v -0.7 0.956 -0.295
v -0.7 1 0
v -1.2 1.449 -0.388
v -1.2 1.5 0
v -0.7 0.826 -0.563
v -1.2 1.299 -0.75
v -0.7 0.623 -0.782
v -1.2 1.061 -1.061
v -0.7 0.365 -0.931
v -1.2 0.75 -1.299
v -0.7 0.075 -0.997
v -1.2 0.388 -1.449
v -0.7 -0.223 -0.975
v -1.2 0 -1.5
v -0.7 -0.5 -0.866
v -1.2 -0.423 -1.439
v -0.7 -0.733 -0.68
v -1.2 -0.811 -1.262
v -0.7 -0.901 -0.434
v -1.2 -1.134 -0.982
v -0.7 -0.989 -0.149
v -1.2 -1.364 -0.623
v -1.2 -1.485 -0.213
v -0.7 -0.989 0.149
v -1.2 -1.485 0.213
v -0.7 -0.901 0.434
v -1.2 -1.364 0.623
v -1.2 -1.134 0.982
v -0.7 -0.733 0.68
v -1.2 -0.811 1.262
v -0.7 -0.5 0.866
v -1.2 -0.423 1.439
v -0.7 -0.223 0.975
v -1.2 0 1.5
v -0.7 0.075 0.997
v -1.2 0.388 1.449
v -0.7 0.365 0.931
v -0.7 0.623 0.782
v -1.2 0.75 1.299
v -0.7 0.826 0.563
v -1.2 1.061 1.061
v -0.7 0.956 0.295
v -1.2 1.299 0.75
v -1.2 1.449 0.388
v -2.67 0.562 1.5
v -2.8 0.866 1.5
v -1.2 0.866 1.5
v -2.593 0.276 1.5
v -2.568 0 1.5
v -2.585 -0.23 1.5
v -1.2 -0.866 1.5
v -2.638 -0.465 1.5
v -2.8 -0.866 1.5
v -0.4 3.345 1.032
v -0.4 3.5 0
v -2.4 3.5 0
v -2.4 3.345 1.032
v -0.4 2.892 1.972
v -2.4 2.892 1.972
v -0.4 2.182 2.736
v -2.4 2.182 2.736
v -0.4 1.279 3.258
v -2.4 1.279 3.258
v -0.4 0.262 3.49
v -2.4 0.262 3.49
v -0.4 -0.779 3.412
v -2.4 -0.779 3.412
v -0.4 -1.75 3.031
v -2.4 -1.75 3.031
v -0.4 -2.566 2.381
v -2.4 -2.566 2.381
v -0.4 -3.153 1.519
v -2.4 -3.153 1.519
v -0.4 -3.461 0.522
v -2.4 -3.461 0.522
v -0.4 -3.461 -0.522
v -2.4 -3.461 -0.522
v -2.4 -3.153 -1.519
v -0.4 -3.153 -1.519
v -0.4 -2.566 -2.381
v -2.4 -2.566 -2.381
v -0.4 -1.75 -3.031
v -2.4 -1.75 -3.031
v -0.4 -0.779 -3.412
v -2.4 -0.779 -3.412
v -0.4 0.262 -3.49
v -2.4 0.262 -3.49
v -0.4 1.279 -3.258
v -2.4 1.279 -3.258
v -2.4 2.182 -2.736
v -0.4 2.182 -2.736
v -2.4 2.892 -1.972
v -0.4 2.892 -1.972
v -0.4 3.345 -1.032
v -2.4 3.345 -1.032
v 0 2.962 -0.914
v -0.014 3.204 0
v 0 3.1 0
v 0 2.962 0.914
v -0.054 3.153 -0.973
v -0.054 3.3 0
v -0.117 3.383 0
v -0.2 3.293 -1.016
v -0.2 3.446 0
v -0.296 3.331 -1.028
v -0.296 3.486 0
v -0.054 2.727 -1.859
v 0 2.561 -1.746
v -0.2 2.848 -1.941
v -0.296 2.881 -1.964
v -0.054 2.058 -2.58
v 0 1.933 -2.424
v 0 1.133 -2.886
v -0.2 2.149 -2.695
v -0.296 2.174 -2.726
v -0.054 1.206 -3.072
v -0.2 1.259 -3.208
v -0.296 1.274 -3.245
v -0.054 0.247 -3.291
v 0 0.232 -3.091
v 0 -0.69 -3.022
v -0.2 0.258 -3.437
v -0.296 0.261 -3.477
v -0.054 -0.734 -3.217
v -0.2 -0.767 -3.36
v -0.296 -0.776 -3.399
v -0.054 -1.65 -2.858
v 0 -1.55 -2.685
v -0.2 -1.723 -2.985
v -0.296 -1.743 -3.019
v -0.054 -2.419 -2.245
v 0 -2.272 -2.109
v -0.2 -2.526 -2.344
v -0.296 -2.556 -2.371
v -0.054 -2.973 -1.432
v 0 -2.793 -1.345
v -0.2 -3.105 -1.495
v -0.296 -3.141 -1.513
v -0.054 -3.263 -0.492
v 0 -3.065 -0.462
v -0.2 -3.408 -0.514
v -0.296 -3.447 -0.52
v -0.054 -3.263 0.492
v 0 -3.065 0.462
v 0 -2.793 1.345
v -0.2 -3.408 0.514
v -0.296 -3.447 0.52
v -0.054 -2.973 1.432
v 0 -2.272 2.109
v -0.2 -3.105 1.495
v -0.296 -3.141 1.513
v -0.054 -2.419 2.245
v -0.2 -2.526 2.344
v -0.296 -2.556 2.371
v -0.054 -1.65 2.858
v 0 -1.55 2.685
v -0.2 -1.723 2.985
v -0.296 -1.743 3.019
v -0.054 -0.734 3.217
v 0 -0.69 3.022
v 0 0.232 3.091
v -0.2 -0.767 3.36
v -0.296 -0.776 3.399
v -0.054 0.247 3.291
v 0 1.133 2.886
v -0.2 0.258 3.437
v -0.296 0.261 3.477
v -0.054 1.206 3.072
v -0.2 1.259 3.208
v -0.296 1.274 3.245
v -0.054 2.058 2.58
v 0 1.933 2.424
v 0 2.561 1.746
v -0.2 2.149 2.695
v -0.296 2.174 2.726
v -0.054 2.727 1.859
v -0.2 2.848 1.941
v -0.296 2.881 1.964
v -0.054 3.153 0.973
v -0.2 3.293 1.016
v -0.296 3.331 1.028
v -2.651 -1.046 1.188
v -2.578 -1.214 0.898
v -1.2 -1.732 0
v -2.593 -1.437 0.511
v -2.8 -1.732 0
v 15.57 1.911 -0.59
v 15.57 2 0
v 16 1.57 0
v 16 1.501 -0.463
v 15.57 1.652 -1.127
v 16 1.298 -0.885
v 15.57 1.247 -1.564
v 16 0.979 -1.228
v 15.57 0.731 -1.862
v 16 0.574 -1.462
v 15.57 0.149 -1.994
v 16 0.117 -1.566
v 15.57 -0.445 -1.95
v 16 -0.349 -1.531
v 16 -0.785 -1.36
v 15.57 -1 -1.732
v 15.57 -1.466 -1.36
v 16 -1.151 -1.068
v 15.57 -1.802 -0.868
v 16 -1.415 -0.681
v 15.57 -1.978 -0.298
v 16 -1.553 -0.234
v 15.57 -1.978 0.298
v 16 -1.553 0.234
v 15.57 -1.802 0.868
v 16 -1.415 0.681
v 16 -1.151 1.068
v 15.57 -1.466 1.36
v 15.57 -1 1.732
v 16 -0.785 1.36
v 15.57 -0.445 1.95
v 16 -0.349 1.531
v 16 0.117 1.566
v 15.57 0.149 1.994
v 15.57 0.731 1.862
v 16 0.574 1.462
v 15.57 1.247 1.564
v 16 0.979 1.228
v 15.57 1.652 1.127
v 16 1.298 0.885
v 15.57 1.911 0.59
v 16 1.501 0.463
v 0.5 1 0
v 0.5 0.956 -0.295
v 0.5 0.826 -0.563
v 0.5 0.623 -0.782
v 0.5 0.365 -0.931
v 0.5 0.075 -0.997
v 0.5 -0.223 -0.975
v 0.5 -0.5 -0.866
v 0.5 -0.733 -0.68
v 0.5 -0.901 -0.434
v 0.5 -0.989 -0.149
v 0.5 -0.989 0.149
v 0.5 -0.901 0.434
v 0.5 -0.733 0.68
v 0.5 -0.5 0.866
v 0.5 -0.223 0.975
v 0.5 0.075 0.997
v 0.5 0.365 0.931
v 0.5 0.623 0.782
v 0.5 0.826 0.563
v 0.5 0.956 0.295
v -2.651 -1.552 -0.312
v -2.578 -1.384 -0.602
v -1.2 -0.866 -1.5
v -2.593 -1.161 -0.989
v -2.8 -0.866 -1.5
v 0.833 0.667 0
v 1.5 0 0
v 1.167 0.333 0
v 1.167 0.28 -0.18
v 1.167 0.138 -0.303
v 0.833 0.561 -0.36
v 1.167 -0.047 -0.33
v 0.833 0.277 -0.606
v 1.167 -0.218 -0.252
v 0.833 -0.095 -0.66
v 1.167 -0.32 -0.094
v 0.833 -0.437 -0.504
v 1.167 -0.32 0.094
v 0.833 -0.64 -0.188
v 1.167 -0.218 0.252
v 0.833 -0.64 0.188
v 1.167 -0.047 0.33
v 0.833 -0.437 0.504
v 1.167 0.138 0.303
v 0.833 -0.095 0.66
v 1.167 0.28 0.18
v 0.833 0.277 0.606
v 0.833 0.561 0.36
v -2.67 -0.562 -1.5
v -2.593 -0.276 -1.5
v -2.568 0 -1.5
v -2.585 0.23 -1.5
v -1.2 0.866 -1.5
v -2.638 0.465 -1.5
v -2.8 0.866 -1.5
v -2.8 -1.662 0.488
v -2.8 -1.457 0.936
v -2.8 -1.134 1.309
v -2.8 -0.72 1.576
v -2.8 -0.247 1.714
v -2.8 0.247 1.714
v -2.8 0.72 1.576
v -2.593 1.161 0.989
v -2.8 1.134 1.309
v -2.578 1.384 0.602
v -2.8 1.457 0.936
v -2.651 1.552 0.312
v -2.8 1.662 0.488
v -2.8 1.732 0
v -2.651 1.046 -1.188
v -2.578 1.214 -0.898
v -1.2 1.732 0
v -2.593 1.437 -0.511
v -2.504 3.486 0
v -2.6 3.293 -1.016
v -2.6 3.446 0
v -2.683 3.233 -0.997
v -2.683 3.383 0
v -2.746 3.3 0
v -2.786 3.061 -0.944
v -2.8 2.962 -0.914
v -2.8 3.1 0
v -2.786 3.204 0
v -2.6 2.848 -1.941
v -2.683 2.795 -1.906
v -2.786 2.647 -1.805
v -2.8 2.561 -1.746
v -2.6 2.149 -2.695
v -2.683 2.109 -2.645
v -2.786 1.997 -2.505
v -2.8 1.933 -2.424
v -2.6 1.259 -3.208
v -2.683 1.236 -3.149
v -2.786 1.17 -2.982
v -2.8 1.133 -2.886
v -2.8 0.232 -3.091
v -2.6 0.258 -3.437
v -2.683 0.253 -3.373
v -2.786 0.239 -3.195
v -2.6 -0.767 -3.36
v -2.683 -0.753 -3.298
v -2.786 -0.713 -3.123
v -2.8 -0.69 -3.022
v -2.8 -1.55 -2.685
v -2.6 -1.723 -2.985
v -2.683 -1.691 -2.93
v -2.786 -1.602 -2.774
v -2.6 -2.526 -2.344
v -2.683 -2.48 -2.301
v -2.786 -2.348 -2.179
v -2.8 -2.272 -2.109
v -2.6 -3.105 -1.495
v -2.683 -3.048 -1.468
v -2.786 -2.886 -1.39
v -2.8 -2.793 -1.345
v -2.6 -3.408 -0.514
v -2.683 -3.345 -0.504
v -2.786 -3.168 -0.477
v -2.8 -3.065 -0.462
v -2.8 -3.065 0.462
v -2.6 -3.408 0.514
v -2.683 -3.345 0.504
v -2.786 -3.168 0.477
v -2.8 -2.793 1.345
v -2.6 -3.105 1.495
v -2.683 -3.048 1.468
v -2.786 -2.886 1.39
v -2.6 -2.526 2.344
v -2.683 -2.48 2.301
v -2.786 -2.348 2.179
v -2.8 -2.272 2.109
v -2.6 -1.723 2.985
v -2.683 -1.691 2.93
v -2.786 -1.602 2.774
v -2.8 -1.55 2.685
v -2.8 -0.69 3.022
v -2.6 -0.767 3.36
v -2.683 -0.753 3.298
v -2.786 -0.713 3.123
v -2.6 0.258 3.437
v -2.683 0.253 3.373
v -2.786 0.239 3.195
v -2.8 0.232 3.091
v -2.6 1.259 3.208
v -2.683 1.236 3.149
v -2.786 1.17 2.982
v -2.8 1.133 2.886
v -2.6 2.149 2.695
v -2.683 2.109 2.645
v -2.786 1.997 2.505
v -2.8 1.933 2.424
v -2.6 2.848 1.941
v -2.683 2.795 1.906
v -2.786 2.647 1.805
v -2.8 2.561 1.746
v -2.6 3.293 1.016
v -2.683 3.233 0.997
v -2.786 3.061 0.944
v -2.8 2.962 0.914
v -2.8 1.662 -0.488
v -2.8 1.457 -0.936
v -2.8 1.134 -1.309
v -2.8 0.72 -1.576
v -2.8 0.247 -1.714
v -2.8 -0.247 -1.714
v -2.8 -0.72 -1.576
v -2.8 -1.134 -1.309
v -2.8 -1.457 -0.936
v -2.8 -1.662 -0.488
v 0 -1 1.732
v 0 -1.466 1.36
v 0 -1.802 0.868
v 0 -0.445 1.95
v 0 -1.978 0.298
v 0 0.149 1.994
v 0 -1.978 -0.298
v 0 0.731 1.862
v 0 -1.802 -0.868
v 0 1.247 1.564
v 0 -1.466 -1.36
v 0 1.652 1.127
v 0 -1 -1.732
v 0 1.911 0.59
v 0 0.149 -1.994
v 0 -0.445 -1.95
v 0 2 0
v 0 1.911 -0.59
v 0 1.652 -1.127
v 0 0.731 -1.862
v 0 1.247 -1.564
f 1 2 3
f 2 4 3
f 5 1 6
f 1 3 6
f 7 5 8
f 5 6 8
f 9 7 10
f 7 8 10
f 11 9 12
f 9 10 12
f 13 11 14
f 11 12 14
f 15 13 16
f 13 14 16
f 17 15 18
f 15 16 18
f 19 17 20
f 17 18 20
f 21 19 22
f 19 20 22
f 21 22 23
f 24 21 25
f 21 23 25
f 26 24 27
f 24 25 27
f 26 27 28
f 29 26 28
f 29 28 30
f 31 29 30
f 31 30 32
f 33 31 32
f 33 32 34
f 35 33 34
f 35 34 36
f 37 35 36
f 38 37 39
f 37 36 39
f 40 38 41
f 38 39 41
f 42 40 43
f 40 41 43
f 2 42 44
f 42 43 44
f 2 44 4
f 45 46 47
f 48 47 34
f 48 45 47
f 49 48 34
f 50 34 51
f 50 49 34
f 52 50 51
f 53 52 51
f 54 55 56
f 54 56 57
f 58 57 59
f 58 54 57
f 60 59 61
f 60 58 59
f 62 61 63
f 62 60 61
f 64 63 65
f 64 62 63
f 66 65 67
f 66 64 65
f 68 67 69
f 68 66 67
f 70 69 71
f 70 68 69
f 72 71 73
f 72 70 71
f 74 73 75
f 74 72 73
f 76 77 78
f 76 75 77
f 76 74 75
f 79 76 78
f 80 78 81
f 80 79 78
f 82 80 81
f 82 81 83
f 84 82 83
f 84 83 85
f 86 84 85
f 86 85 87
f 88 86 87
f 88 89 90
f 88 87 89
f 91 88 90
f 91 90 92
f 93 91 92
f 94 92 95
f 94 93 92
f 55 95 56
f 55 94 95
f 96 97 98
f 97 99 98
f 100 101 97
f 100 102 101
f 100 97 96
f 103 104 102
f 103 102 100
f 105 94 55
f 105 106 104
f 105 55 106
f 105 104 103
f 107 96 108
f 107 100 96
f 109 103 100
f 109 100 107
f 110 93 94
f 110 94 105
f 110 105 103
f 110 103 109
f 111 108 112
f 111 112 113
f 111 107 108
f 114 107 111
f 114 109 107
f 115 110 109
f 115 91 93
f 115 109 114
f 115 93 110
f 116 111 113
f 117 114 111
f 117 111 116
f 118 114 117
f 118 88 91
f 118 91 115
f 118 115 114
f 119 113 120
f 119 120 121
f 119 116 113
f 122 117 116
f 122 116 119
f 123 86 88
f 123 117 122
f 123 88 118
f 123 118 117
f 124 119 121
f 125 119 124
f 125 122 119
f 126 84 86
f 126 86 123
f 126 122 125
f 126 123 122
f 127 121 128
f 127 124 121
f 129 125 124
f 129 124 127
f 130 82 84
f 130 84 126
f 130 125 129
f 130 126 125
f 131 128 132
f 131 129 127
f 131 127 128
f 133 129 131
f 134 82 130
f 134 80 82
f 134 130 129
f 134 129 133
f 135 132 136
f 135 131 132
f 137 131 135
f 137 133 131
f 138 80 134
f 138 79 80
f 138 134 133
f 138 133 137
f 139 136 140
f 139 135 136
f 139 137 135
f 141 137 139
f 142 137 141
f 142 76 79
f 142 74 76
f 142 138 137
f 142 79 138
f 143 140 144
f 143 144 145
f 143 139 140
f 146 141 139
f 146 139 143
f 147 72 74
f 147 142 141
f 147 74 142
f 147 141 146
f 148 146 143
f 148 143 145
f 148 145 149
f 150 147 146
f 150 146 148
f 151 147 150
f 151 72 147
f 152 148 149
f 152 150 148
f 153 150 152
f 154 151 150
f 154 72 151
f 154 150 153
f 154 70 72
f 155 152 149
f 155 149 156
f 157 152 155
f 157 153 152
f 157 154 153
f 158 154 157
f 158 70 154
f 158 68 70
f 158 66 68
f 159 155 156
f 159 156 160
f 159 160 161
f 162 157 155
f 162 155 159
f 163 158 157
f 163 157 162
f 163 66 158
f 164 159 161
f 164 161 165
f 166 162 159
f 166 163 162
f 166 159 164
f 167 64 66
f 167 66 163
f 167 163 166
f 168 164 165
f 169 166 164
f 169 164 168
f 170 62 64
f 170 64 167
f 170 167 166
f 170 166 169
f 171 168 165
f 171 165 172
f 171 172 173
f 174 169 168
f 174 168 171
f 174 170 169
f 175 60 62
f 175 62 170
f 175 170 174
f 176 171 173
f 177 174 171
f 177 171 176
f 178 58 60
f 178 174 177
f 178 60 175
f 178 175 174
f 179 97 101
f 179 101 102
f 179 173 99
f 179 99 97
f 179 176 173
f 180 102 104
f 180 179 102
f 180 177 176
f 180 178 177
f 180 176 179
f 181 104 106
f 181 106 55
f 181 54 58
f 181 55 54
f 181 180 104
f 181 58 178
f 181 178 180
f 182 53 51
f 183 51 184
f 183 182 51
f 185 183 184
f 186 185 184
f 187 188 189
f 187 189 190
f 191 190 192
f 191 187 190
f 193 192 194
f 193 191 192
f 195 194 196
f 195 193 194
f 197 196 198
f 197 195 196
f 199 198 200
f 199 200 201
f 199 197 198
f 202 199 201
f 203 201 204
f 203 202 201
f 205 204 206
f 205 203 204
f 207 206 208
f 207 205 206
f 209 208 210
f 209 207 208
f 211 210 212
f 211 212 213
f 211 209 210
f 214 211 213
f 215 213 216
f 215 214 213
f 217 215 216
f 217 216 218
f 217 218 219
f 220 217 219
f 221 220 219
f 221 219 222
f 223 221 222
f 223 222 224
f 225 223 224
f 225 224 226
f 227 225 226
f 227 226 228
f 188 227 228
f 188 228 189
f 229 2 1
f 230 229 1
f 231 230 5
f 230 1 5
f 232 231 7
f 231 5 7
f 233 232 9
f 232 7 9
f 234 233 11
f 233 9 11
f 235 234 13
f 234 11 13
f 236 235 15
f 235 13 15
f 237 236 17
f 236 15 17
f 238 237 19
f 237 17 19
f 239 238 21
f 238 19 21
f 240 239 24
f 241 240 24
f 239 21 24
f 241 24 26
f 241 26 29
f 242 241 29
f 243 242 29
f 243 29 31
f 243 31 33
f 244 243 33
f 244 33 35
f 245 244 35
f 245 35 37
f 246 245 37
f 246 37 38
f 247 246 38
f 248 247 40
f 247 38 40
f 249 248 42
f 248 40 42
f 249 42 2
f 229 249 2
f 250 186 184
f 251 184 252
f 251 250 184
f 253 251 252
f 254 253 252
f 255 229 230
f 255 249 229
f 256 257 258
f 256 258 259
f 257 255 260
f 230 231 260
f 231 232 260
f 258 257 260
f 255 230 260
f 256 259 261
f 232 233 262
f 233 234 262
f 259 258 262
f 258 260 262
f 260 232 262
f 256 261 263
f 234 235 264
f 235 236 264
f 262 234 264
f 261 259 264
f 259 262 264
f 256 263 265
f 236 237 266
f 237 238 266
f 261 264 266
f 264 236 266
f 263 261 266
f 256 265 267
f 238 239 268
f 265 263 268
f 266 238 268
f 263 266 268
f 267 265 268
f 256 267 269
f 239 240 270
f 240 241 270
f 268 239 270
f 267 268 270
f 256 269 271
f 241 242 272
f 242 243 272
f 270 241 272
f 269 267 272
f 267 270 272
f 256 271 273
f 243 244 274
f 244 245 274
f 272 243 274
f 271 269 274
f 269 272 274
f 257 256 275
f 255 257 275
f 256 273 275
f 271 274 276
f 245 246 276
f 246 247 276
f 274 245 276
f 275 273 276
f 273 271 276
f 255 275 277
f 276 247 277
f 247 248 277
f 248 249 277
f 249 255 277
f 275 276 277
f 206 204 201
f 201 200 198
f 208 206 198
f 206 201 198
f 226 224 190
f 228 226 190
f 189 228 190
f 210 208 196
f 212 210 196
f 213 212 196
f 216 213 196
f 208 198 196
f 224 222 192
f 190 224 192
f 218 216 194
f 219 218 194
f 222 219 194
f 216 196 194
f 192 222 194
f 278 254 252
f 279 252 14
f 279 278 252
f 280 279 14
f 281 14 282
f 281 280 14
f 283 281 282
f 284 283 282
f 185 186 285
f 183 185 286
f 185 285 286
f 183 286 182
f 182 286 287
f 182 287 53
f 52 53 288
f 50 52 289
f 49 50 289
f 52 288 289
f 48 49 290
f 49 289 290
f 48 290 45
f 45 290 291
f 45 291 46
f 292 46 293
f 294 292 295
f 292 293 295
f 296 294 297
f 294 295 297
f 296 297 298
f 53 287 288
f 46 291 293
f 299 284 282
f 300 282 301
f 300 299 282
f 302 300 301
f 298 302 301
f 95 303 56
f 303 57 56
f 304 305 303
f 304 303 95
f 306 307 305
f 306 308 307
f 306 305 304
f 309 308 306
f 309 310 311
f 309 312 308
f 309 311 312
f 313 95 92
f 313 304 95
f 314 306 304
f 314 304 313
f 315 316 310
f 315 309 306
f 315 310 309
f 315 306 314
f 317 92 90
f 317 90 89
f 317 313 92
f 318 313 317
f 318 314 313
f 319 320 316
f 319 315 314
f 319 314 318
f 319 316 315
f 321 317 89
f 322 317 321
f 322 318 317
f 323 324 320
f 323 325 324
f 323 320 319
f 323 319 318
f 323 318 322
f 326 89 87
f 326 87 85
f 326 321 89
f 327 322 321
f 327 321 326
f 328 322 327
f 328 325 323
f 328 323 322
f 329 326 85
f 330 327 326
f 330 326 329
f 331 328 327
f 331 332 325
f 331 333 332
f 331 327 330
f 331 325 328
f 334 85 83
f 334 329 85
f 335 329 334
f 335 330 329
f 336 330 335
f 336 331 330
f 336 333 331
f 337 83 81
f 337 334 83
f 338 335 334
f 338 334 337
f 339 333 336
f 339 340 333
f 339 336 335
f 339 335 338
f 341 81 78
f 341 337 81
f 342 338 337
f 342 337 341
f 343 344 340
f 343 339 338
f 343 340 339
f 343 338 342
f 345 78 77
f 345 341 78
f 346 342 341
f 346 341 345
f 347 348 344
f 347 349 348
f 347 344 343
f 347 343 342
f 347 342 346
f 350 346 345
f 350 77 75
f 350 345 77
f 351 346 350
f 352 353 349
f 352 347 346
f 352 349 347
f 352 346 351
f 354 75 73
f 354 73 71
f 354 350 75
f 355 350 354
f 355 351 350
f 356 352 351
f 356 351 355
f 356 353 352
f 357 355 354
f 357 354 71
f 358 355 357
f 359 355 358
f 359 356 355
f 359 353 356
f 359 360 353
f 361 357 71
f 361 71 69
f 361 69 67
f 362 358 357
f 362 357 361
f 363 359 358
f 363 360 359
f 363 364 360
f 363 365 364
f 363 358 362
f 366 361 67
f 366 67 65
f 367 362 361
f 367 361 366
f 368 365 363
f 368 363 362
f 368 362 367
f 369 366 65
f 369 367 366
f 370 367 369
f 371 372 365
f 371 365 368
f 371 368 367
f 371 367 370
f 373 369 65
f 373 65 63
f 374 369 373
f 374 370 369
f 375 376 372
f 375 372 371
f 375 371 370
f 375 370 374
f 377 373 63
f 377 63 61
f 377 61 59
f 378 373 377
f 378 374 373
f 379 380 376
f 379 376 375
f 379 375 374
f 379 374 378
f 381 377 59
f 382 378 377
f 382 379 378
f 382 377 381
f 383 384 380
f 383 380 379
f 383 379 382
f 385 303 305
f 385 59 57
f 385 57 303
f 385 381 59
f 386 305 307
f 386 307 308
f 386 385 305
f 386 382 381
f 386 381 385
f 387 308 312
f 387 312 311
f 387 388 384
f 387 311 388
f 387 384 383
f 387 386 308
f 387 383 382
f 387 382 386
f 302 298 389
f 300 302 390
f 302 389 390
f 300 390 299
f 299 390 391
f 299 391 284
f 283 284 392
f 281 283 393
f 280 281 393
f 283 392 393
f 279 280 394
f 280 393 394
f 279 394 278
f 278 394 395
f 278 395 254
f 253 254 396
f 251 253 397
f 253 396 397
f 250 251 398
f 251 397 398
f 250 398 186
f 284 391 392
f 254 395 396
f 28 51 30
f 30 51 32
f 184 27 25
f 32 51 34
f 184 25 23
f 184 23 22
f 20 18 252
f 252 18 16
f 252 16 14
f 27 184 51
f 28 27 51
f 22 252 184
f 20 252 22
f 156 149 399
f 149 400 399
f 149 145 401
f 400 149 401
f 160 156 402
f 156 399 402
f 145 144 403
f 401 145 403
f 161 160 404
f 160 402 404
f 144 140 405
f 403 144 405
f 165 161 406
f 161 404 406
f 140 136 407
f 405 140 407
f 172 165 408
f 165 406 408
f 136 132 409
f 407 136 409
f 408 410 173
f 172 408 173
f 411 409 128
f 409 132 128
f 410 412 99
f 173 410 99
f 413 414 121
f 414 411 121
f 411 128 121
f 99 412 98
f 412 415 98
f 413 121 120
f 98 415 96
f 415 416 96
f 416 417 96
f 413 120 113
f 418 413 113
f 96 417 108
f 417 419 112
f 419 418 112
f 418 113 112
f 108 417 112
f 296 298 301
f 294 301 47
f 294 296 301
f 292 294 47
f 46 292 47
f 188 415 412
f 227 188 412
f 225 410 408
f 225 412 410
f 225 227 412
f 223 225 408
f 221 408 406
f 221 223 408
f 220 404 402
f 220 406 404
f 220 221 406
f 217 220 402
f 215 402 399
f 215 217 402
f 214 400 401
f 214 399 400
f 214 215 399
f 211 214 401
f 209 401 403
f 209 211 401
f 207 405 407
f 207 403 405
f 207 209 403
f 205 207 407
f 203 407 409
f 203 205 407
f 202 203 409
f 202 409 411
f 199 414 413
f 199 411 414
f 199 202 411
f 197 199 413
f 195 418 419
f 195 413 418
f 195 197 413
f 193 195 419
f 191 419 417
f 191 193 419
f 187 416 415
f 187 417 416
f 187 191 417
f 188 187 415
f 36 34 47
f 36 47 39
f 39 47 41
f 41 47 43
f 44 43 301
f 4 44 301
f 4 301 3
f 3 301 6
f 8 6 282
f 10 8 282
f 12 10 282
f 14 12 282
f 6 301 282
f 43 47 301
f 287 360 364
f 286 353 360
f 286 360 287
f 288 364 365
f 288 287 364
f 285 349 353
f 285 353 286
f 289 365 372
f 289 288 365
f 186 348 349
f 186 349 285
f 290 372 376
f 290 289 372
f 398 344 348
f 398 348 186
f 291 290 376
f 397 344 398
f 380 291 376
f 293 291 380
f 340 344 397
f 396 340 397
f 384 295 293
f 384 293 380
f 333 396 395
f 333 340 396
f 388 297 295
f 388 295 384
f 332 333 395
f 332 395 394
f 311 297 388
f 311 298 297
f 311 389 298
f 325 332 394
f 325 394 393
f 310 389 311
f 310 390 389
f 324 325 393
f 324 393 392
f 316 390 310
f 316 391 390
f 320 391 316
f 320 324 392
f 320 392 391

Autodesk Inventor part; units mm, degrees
sketch "Sketch_1" plane through (0, 0, 0) normal (0, 0, 1) x (1, 0, 0)
  line L0 (16, 0) -> (1.5, 0)
  line L1 (1.5, 0) -> (0.5, 1)
  line L2 (0.5, 1) -> (-0.7, 1)
  line L3 (-0.7, 1) -> (-1.2, 1.5)
  line L4 (-1.2, 1.5) -> (-2.5679, 1.5)
  line L5 (-2.5679, 1.5) -> (-2.8, 1.7321)
  line L6 (-2.8, 1.7321) -> (-2.8, 3.1)
  arc A0 (-2.4, 3.5) -> (-2.8, 3.1) centre (-2.4, 3.1) ccw
  line L7 (-2.4, 3.5) -> (-0.4, 3.5)
  arc A1 (0, 3.1) -> (-0.4, 3.5) centre (-0.4, 3.1) ccw
  line L8 (0, 3.1) -> (0, 2)
  line L9 (0, 2) -> (15.5705, 2)
  line L10 (15.5705, 2) -> (16, 1.5705)
  line L11 (16, 1.5705) -> (16, 0)
  line L12 (16, 0) -> (1.5, 0)
revolve "Revolution1" add sketch "Sketch_1" angle 360 about axis through (16, 0, 0) along (-1, 0, 0)
thread "Thread1" size "M4x0.7" class "6g" standard "ISO Metric profile" length 12.0705
sketch "Sketch_2" plane through (-2.8, 0, 0) normal (1, 0, 0) x (0, 0, -1)
  line L0 (-1.5, -0.866) -> (0, -1.7321)
  line L1 (0, -1.7321) -> (1.5, -0.866)
  line L2 (1.5, -0.866) -> (1.5, 0.866)
  line L3 (1.5, 0.866) -> (0, 1.7321)
  line L4 (0, 1.7321) -> (-1.5, 0.866)
  line L5 (-1.5, 0.866) -> (-1.5, -0.866)
extrude "Extrusion1" cut sketch "Sketch_2" along normal blind 1.6
ref_plane "MONTAGE_XY" through (0, 0, 0) normal (1, 0, 0) x (0, 0, -1)
ref_plane "MONTAGE_YZ" through (0, 0, 0) normal (0, 0, -1) x (0, 1, 0)
ref_plane "MONTAGE_ZX" through (0, 0, 0) normal (0, 1, 0) x (1, 0, 0)
ref_plane "Schrauben_punkt_XY" through (16, 0, 0) normal (-1, 0, 0) x (0, 0, -1)
ref_plane "Schrauben_punkt_YZ" through (16, 0, 0) normal (0, 0, -1) x (0, -1, 0)
ref_plane "Schrauben_punkt_ZX" through (16, 0, 0) normal (0, -1, 0) x (-1, 0, 0)
properties part number "DIN-6912 - M4x16(F)"
